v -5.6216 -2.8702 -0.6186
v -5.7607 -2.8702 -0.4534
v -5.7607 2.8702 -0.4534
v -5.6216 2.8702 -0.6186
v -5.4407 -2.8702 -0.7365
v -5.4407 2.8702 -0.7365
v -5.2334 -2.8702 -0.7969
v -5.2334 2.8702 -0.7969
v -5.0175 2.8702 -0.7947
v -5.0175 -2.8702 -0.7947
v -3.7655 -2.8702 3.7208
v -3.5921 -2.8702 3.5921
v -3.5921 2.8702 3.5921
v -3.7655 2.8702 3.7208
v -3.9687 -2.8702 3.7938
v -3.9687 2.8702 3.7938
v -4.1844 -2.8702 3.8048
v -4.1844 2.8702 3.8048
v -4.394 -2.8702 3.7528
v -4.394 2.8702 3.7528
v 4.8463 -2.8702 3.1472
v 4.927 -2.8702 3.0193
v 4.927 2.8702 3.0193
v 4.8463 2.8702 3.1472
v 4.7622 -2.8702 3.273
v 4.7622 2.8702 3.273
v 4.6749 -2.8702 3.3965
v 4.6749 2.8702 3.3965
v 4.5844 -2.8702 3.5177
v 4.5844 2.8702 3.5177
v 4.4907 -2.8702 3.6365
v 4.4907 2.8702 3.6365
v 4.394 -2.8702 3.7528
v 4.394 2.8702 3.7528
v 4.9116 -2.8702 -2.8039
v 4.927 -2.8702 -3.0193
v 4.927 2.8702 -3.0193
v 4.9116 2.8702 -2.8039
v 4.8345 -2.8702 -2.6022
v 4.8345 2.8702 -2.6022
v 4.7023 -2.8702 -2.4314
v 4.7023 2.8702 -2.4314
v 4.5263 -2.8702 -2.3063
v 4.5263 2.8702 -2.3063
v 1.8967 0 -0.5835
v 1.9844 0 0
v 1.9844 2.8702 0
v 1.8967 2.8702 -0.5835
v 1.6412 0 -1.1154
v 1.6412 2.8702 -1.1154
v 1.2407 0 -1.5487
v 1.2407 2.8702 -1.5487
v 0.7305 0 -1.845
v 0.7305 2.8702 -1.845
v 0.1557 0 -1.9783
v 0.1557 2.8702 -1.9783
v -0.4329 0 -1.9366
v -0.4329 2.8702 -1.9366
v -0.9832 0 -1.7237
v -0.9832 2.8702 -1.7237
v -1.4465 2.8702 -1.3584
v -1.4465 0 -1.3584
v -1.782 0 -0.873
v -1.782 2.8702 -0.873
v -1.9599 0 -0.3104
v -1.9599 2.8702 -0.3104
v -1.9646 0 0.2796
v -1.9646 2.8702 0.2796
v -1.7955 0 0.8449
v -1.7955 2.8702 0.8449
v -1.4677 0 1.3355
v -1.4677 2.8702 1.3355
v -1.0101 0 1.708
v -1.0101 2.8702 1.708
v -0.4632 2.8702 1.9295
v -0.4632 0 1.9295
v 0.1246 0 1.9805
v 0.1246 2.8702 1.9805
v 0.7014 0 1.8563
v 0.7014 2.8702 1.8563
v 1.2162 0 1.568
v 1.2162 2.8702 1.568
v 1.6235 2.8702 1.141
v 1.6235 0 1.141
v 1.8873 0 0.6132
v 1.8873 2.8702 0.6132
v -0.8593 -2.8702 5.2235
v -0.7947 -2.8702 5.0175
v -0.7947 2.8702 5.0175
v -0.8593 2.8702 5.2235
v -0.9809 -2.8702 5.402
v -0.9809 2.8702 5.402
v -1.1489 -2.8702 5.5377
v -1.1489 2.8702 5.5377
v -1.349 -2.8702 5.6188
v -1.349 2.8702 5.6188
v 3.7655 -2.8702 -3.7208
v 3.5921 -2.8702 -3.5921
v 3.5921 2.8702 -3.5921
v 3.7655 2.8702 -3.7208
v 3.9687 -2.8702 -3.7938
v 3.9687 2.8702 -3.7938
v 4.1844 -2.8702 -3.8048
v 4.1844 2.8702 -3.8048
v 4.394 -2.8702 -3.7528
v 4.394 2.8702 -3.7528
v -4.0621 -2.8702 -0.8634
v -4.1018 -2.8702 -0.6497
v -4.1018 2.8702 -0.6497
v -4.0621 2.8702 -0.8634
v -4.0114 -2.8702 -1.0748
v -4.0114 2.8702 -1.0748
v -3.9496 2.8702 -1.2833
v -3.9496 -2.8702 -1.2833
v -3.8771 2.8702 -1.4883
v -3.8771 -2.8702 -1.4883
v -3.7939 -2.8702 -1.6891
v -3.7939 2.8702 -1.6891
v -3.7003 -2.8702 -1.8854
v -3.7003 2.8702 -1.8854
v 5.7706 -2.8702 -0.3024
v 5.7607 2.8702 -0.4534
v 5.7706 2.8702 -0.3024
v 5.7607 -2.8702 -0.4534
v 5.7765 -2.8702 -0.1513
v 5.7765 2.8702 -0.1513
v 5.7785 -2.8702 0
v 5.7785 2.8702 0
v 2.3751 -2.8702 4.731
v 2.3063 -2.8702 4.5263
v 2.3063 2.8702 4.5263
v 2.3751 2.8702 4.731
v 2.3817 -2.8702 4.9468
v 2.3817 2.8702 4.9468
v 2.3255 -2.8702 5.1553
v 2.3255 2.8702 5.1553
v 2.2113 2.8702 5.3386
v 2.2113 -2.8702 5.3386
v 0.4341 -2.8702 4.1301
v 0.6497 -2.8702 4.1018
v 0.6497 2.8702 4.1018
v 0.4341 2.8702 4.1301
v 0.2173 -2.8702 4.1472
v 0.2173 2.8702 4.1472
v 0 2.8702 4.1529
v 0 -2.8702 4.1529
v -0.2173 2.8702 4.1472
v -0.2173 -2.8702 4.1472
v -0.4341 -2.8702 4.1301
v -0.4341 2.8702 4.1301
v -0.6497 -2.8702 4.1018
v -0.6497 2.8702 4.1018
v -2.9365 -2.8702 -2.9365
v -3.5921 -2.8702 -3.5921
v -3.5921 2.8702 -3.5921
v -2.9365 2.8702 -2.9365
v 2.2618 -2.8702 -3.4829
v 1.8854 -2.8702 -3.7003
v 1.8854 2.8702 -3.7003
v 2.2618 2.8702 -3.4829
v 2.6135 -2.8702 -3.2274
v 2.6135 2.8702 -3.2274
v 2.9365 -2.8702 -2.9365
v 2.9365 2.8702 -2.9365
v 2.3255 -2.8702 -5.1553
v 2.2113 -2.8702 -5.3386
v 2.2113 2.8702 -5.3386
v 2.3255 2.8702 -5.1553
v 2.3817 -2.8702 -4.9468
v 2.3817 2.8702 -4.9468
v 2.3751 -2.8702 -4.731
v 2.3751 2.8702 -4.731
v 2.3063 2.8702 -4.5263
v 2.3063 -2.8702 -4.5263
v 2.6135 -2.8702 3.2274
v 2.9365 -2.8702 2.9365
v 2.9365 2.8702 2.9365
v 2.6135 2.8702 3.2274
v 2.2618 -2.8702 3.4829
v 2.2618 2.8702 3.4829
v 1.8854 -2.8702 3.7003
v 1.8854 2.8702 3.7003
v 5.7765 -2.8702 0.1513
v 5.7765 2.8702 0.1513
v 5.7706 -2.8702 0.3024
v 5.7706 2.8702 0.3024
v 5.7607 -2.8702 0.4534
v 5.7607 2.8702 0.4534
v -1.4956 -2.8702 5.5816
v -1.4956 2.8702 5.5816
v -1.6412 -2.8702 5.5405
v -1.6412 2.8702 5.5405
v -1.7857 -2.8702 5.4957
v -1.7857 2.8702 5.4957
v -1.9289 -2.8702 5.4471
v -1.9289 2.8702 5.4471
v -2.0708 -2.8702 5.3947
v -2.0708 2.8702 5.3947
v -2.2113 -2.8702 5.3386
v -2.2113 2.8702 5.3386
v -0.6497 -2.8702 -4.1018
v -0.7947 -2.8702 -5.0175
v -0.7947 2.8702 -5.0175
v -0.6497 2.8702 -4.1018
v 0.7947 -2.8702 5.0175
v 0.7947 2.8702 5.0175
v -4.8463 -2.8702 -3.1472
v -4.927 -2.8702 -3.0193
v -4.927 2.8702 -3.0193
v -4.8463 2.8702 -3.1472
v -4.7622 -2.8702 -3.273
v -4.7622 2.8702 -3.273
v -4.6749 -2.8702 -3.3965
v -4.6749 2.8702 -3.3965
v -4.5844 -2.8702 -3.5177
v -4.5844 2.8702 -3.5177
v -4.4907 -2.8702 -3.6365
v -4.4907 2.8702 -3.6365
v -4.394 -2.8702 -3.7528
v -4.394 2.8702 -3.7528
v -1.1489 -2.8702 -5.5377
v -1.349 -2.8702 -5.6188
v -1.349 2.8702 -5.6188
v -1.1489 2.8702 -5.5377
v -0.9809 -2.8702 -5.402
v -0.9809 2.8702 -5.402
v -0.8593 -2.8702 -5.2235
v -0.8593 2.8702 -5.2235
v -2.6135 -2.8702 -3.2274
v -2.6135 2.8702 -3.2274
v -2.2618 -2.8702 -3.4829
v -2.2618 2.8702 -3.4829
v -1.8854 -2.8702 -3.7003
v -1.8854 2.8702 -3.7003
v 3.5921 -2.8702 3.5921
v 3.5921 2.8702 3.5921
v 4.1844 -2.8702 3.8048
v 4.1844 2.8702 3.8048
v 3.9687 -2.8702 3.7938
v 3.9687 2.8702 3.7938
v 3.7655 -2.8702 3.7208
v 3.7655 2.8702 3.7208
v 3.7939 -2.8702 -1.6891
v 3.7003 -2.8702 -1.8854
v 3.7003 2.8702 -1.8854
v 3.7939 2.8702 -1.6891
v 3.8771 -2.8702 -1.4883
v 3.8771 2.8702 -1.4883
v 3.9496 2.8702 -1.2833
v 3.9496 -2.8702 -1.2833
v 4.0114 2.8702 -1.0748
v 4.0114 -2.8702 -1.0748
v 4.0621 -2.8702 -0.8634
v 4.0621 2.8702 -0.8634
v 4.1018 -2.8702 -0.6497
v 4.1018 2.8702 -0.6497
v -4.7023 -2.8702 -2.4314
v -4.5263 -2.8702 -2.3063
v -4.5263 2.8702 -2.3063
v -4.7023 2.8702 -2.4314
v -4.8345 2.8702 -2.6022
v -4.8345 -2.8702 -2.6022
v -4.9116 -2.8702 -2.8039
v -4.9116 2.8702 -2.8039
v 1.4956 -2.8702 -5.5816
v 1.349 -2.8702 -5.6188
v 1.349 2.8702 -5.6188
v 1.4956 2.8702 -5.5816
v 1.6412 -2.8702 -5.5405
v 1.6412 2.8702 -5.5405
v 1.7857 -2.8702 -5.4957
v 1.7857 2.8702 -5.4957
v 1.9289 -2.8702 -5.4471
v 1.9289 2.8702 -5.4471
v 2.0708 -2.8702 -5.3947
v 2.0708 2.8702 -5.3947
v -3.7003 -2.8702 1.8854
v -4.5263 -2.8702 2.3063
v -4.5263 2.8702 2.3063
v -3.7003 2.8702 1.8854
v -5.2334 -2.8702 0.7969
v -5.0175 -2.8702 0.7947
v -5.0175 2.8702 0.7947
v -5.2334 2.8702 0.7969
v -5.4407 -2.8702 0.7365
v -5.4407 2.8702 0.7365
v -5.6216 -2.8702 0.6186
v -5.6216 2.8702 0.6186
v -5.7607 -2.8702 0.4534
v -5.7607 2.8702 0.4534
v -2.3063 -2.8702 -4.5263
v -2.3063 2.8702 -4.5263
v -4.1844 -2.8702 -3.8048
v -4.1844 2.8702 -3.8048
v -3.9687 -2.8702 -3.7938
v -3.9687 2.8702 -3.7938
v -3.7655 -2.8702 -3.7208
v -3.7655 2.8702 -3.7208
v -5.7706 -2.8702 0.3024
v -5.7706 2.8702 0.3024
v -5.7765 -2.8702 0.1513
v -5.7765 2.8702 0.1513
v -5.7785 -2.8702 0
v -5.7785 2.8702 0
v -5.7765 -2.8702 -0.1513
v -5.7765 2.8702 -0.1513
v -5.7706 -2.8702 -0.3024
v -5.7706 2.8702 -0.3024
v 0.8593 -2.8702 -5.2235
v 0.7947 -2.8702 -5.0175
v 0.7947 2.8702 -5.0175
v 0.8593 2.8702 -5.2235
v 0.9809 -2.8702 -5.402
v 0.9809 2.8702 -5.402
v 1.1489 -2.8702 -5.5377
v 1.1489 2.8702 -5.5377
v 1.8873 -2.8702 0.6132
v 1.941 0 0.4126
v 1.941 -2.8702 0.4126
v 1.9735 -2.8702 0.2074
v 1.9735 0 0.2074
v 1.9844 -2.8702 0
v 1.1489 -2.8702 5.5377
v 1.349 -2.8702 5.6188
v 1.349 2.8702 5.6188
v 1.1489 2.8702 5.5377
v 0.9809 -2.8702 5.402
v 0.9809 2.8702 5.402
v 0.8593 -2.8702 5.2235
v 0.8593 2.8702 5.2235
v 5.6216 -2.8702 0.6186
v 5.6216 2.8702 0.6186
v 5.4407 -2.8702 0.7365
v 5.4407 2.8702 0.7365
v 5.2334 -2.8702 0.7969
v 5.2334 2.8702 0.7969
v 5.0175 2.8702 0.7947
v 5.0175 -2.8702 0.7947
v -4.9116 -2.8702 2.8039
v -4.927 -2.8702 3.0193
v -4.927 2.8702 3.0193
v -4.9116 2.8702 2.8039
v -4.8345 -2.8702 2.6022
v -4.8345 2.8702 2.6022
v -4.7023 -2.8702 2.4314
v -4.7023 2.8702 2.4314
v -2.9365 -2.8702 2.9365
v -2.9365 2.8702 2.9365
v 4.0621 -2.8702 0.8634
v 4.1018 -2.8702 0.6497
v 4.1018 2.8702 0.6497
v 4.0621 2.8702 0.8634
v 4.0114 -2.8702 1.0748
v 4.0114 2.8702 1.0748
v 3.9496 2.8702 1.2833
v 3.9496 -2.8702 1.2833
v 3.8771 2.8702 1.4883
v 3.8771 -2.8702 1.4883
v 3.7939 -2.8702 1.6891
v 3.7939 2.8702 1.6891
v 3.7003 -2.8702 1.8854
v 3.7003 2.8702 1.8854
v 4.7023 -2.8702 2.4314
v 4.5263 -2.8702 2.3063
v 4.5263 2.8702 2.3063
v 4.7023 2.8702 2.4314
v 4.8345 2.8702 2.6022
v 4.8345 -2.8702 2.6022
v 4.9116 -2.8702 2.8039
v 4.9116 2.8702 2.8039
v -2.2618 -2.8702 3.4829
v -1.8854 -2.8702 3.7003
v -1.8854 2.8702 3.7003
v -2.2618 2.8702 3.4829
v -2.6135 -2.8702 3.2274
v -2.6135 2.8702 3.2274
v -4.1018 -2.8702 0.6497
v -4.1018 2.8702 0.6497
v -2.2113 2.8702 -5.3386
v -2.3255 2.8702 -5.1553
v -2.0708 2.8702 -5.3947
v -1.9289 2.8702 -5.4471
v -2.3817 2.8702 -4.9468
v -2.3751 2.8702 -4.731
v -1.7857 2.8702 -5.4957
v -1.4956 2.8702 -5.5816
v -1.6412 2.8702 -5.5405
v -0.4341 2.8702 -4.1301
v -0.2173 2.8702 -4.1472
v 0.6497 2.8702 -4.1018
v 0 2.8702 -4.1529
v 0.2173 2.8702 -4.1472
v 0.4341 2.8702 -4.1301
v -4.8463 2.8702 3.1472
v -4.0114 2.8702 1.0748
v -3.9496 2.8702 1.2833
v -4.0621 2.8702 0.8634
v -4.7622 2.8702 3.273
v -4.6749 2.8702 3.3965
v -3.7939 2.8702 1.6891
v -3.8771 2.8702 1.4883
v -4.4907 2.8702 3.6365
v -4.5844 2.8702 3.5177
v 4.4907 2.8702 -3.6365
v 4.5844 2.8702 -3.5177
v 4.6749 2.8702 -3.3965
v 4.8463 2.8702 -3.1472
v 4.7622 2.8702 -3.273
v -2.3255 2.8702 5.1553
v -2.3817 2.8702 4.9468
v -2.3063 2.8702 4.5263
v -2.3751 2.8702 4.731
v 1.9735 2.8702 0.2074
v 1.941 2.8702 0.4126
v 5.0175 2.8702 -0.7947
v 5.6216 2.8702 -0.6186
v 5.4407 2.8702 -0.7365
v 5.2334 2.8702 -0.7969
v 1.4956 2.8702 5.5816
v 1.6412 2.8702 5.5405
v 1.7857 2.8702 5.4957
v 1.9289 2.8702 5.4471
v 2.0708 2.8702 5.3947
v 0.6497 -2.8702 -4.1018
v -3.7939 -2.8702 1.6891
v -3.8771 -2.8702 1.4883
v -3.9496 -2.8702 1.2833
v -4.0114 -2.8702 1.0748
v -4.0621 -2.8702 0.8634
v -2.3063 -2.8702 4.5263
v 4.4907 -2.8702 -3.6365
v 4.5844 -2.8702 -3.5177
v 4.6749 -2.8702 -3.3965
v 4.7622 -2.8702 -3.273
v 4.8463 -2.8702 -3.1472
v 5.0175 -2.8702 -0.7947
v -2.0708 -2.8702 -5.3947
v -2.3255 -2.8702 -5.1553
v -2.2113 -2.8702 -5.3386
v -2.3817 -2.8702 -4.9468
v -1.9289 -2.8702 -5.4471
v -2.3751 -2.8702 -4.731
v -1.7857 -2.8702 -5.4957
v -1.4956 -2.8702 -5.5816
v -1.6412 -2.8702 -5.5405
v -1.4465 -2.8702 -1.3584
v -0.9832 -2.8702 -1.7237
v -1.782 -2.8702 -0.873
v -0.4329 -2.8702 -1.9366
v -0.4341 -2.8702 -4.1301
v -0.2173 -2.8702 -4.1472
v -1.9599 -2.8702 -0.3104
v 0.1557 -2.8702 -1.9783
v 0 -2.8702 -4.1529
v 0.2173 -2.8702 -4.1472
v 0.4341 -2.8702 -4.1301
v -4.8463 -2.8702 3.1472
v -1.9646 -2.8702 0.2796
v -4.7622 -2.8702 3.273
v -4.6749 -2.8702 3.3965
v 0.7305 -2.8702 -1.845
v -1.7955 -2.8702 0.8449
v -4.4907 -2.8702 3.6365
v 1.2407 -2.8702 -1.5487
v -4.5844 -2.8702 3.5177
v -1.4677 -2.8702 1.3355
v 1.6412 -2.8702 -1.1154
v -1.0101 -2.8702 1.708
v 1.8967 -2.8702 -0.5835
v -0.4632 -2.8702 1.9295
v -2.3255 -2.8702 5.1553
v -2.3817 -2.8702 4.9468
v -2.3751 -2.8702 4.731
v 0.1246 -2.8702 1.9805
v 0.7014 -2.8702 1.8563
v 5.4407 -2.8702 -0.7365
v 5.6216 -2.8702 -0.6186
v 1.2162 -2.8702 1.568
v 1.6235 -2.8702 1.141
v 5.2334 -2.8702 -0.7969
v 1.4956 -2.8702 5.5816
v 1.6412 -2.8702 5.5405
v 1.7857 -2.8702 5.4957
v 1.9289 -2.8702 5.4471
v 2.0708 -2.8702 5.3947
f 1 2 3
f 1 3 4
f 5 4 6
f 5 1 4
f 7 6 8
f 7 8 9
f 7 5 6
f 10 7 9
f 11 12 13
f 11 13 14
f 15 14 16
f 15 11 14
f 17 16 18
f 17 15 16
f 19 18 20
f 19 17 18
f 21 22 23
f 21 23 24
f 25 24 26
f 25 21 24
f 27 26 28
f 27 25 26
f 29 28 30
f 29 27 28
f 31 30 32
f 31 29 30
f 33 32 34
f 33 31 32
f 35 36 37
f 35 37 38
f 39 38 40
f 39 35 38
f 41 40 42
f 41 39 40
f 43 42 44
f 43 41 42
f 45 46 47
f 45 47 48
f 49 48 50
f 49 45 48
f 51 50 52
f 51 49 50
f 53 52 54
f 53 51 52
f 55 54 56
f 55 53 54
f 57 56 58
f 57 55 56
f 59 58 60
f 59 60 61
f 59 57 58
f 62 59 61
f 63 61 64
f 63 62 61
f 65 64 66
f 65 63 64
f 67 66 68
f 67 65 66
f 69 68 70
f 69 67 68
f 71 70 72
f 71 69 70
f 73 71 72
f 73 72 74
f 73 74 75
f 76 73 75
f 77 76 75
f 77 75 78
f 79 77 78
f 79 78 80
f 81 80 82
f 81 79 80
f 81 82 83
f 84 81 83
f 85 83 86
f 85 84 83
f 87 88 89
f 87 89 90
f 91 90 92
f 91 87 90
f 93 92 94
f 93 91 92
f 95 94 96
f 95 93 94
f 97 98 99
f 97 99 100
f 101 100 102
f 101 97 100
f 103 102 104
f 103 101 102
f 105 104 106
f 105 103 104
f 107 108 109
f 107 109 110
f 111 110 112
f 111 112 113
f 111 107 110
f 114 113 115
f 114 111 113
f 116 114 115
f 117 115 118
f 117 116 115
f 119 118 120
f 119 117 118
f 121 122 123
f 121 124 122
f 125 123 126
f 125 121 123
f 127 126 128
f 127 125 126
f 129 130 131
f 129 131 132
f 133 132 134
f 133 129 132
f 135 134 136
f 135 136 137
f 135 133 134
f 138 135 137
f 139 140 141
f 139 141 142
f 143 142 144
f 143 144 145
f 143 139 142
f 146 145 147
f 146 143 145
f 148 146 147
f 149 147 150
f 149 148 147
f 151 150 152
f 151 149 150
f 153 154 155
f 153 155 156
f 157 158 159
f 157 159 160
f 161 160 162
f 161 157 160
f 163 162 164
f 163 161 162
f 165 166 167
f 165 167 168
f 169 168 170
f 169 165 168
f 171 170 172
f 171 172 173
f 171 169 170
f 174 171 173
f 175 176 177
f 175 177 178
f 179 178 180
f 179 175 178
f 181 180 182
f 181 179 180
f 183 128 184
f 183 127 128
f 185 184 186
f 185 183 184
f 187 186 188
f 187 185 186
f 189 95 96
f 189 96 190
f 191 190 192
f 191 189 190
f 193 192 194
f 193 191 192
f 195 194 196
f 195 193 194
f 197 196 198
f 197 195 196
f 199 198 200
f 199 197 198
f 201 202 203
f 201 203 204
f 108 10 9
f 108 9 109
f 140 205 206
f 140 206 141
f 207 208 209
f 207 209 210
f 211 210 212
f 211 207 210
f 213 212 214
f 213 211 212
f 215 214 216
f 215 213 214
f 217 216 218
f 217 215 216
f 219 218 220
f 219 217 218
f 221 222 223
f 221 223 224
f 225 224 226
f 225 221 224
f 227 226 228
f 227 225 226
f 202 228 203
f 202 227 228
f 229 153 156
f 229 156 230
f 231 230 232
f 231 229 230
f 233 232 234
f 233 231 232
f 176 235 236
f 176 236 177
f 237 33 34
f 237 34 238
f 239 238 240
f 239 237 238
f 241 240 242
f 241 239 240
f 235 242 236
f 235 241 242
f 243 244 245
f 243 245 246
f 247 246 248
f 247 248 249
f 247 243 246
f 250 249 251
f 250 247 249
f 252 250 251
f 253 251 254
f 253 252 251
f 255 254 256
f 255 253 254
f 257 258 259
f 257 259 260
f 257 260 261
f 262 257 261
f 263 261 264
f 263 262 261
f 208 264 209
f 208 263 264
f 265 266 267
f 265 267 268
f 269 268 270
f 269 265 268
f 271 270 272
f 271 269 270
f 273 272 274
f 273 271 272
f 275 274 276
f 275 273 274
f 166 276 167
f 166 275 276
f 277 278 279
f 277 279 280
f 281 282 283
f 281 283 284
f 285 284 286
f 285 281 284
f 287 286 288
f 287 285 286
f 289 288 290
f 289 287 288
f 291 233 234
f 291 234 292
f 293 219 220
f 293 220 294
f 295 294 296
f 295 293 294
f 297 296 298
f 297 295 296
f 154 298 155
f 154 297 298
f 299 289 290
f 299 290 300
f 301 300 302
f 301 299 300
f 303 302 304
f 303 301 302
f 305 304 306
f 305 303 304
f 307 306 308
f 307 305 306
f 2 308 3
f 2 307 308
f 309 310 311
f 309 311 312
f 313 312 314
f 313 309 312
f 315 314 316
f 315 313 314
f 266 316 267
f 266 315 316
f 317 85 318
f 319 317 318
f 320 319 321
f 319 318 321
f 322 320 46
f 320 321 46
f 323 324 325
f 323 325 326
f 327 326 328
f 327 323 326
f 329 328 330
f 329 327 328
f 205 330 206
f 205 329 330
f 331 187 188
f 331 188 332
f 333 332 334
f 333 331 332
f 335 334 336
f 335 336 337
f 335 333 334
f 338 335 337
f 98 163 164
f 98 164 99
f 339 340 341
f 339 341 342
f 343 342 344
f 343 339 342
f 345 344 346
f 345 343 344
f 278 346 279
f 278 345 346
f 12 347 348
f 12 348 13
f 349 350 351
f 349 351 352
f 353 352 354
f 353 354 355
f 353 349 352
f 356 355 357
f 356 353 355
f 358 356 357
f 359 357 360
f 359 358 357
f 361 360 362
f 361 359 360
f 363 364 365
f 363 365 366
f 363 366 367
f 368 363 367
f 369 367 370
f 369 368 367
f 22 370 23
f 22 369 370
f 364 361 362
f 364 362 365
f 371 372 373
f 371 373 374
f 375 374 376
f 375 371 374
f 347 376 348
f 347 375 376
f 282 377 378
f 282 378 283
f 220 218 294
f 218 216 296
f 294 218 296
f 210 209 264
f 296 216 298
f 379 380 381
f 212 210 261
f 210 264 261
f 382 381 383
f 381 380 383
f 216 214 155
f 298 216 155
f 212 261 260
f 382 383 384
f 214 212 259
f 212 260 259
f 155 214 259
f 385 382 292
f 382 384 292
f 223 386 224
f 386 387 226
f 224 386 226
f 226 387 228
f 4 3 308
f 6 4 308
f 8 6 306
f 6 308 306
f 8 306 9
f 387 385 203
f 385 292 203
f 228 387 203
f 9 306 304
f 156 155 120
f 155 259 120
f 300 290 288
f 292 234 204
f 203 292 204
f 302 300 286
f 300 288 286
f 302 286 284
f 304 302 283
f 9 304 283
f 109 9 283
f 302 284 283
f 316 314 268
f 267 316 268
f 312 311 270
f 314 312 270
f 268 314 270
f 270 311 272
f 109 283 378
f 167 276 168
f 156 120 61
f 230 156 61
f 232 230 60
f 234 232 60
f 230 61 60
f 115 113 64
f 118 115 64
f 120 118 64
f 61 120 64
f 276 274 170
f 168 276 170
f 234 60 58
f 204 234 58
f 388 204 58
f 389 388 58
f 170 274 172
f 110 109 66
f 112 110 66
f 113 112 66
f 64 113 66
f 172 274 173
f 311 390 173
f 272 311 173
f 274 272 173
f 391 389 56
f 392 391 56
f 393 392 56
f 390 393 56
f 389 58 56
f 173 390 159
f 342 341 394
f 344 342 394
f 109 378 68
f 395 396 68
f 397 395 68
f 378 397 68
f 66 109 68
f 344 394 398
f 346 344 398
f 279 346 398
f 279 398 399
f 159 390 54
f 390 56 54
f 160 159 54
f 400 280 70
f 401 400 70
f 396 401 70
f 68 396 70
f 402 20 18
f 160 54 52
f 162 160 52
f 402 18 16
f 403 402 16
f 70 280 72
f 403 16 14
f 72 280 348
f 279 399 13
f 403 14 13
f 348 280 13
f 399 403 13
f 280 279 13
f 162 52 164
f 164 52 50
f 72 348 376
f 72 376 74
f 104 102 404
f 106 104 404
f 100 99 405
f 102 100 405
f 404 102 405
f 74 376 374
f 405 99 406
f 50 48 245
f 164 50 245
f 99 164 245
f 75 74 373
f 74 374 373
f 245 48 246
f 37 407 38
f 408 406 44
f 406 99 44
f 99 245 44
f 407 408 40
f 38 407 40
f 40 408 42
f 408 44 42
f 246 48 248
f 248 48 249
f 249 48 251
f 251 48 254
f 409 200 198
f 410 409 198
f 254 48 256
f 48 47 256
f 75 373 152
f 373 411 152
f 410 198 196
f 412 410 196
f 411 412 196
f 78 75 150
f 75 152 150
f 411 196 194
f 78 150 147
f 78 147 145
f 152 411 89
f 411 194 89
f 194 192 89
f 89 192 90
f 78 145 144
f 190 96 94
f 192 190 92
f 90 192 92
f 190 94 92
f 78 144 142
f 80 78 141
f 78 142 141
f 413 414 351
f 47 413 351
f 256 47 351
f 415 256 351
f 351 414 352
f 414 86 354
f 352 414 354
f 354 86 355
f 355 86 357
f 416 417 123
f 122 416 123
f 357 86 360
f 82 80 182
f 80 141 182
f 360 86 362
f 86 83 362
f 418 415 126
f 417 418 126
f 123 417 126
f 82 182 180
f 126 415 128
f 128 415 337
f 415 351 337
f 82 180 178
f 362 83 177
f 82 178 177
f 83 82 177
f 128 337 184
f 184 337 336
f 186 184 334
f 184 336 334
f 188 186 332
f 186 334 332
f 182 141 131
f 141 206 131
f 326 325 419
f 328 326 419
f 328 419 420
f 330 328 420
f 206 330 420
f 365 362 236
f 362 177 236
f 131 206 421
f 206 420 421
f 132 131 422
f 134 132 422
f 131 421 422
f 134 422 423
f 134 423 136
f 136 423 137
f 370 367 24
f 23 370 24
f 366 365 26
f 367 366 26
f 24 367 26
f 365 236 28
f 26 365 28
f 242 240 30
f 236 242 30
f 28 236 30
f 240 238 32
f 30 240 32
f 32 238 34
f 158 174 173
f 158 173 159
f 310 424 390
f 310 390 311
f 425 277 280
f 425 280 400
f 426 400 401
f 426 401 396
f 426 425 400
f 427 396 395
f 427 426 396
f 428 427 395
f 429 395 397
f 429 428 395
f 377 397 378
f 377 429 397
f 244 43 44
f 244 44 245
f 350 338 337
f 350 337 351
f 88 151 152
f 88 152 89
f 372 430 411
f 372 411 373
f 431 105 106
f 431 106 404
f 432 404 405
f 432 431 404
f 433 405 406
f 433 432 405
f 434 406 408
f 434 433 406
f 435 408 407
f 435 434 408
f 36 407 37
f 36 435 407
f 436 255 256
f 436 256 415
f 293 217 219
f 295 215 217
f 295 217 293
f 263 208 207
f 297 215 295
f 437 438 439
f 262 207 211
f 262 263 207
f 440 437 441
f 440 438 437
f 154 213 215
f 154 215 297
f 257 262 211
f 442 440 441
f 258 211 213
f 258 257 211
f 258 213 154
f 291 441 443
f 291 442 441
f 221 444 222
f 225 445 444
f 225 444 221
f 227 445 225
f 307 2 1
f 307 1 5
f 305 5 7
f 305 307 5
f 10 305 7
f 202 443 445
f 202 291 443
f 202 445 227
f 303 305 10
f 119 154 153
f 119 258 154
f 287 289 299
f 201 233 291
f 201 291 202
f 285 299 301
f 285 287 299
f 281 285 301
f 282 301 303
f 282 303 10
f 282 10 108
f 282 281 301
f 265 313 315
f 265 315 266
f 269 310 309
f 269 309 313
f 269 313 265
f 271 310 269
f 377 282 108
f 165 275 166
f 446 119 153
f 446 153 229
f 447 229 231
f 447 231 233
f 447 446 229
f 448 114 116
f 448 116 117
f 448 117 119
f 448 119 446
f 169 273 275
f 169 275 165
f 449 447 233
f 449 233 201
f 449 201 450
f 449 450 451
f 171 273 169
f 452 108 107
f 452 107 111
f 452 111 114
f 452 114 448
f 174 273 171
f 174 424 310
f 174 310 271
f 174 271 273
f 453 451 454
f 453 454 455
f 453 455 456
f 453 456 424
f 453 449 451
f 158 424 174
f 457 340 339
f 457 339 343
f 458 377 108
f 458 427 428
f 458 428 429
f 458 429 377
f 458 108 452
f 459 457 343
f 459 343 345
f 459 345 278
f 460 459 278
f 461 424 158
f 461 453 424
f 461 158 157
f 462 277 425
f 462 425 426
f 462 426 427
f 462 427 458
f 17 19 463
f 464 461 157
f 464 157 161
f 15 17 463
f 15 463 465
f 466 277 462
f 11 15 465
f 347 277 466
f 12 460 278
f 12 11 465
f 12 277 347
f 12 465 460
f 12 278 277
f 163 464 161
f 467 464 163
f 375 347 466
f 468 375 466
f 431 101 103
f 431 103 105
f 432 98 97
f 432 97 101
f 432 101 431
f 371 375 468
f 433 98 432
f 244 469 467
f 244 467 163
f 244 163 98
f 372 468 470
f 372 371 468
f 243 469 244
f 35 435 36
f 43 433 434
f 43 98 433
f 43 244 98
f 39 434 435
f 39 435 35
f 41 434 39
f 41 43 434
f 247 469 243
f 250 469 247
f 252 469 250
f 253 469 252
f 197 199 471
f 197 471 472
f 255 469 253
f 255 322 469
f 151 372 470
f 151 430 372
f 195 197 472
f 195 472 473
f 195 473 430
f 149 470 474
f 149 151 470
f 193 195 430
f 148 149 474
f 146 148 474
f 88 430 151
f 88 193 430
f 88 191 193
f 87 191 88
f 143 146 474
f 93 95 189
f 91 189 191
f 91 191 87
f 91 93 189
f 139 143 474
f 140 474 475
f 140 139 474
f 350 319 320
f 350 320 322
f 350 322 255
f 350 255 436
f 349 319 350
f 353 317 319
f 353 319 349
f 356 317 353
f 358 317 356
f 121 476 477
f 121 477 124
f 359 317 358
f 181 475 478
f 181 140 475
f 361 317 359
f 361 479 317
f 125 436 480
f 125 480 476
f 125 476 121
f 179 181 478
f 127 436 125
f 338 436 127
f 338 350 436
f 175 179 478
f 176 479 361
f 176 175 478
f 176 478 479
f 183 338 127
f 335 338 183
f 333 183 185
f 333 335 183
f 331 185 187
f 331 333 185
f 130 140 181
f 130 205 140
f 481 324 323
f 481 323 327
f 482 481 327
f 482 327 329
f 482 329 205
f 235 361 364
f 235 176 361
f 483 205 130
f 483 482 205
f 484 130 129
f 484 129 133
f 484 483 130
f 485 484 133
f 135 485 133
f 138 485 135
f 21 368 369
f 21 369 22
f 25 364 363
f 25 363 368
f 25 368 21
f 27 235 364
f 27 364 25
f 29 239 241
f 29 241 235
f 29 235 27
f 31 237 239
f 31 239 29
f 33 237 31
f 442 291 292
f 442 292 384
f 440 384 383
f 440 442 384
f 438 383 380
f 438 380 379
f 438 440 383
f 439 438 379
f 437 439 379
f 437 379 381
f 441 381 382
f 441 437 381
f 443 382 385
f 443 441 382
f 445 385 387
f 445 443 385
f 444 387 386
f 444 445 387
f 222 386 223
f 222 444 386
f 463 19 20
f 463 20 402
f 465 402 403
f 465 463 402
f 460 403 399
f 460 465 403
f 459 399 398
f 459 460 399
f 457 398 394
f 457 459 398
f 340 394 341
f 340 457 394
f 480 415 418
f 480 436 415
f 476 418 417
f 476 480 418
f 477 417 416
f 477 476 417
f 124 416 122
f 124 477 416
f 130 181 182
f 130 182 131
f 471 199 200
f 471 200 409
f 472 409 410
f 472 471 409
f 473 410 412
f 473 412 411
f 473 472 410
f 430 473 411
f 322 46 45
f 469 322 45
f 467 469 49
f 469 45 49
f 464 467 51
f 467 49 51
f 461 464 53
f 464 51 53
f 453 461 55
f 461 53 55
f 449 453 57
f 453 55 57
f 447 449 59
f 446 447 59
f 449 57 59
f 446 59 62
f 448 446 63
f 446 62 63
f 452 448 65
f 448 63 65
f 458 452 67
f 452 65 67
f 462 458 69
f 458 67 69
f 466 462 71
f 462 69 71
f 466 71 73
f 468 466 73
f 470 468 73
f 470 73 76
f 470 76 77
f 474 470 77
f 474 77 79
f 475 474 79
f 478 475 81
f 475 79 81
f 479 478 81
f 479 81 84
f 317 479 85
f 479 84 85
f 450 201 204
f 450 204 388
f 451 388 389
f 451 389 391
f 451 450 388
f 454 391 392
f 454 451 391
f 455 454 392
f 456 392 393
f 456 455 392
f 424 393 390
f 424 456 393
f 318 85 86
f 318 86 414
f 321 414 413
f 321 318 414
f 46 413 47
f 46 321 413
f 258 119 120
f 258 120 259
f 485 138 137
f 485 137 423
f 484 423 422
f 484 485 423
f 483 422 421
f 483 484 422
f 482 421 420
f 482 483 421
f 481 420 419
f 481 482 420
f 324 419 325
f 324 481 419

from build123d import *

# Parameters (mm, degrees)
F1_DEPTH = 2.8702


with BuildPart() as f1:
    # F0 (on Front) → F1 (new body, symmetric)
    with BuildSketch(Plane.XZ):
        with BuildLine():
            ThreePointArc((5.7785, 0), (5.7740449859, 0.2268628454), (5.760686813, 0.4533758847))
            ThreePointArc((5.760686813, 0.4533758847), (5.4407027929, 0.736461757), (5.0174567702, 0.7946870824))
            Line((5.0174567702, 0.7946870824), (4.1017709097, 0.6496566899))
            ThreePointArc((4.1017709097, 0.6496566899), (4.0381550424, 0.9694752516), (3.9496426065, 1.2833166759))
            Line((3.9496426065, 1.2833166759), (1.8872527745, 0.6132055982))
            ThreePointArc((1.8872527745, 0.6132055982), (1.9599440509, 0.3104246416), (1.984375, 0))
            Line((1.984375, 0), (5.7785, 0))
        make_face()
        with BuildLine():
            ThreePointArc((5.760686813, -0.4533758847), (5.7740449859, -0.2268628454), (5.7785, 0))
            Line((5.7785, 0), (1.984375, 0))
            ThreePointArc((1.984375, 0), (-1.9599440509, -0.3104246416), (1.8872527745, 0.6132055982))
            Line((1.8872527745, 0.6132055982), (3.9496426065, 1.2833166759))
            ThreePointArc((3.9496426065, 1.2833166759), (3.8367793106, 1.5892460263), (3.7002609943, 1.8853771464))
            Line((3.7002609943, 1.8853771464), (4.5263131429, 2.3062717387))
            ThreePointArc((4.5263131429, 2.3062717387), (4.8345023804, 2.6021547867), (4.9269811897, 3.0192579562))
            ThreePointArc((4.9269811897, 3.0192579562), (4.8046471547, 3.2103625915), (4.674904702, 3.3965170804))
            ThreePointArc((4.674904702, 3.3965170804), (4.5379538851, 3.5774343861), (4.3940058722, 3.7528355473))
            ThreePointArc((4.3940058722, 3.7528355473), (3.9687396612, 3.7937749409), (3.5921024484, 3.5921024484))
            Line((3.5921024484, 3.5921024484), (2.9365437516, 2.9365437516))
            ThreePointArc((2.9365437516, 2.9365437516), (2.6970927999, 3.1578899345), (2.4410133742, 3.3597666759))
            ThreePointArc((2.4410133742, 3.3597666759), (2.1698842894, 3.5409293385), (1.8853771464, 3.7002609943))
            Line((1.8853771464, 3.7002609943), (2.3062717387, 4.5263131429))
            ThreePointArc((2.3062717387, 4.5263131429), (2.3816863773, 4.9468366458), (2.2113362139, 5.3386378786))
            ThreePointArc((2.2113362139, 5.3386378786), (2.0000374143, 5.4213386346), (1.785654702, 5.4956800794))
            ThreePointArc((1.785654702, 5.4956800794), (1.5685186395, 5.5615475838), (1.348964035, 5.618839585))
            ThreePointArc((1.348964035, 5.618839585), (0.9808528714, 5.401995043), (0.7946870824, 5.0174567702))
            Line((0.7946870824, 5.0174567702), (0.6496566899, 4.1017709097))
            ThreePointArc((0.6496566899, 4.1017709097), (0.3258327786, 4.1400979953), (0, 4.1529))
            ThreePointArc((0, 4.1529), (-0.3258327786, 4.1400979953), (-0.6496566899, 4.1017709097))
            Line((-0.6496566899, 4.1017709097), (-0.7946870824, 5.0174567702))
            ThreePointArc((-0.7946870824, 5.0174567702), (-0.9808528714, 5.401995043), (-1.348964035, 5.618839585))
            ThreePointArc((-1.348964035, 5.618839585), (-1.5685186395, 5.5615475838), (-1.785654702, 5.4956800794))
            ThreePointArc((-1.785654702, 5.4956800794), (-2.0000374143, 5.4213386346), (-2.2113362139, 5.3386378786))
            ThreePointArc((-2.2113362139, 5.3386378786), (-2.3816863773, 4.9468366458), (-2.3062717387, 4.5263131429))
            Line((-2.3062717387, 4.5263131429), (-1.8853771464, 3.7002609943))
            ThreePointArc((-1.8853771464, 3.7002609943), (-2.1698842894, 3.5409293385), (-2.4410133742, 3.3597666759))
            ThreePointArc((-2.4410133742, 3.3597666759), (-2.6970927999, 3.1578899345), (-2.9365437516, 2.9365437516))
            Line((-2.9365437516, 2.9365437516), (-3.5921024484, 3.5921024484))
            ThreePointArc((-3.5921024484, 3.5921024484), (-3.9687396612, 3.7937749409), (-4.3940058722, 3.7528355473))
            ThreePointArc((-4.3940058722, 3.7528355473), (-4.5379538851, 3.5774343861), (-4.674904702, 3.3965170804))
            ThreePointArc((-4.674904702, 3.3965170804), (-4.8046471547, 3.2103625915), (-4.9269811897, 3.0192579562))
            ThreePointArc((-4.9269811897, 3.0192579562), (-4.8345023804, 2.6021547867), (-4.5263131429, 2.3062717387))
            Line((-4.5263131429, 2.3062717387), (-3.7002609943, 1.8853771464))
            ThreePointArc((-3.7002609943, 1.8853771464), (-3.8367793106, 1.5892460263), (-3.9496426065, 1.2833166759))
            ThreePointArc((-3.9496426065, 1.2833166759), (-4.0381550424, 0.9694752516), (-4.1017709097, 0.6496566899))
            Line((-4.1017709097, 0.6496566899), (-5.0174567702, 0.7946870824))
            ThreePointArc((-5.0174567702, 0.7946870824), (-5.4407027929, 0.736461757), (-5.760686813, 0.4533758847))
            ThreePointArc((-5.760686813, 0.4533758847), (-5.7740449859, 0.2268628454), (-5.7785, 0))
            ThreePointArc((-5.7785, 0), (-5.7740449859, -0.2268628454), (-5.760686813, -0.4533758847))
            ThreePointArc((-5.760686813, -0.4533758847), (-5.4407027929, -0.736461757), (-5.0174567702, -0.7946870824))
            Line((-5.0174567702, -0.7946870824), (-4.1017709097, -0.6496566899))
            ThreePointArc((-4.1017709097, -0.6496566899), (-4.0381550424, -0.9694752516), (-3.9496426065, -1.2833166759))
            ThreePointArc((-3.9496426065, -1.2833166759), (-3.8367793106, -1.5892460263), (-3.7002609943, -1.8853771464))
            Line((-3.7002609943, -1.8853771464), (-4.5263131429, -2.3062717387))
            ThreePointArc((-4.5263131429, -2.3062717387), (-4.8345023804, -2.6021547867), (-4.9269811897, -3.0192579562))
            ThreePointArc((-4.9269811897, -3.0192579562), (-4.8046471547, -3.2103625915), (-4.674904702, -3.3965170804))
            ThreePointArc((-4.674904702, -3.3965170804), (-4.5379538851, -3.5774343861), (-4.3940058722, -3.7528355473))
            ThreePointArc((-4.3940058722, -3.7528355473), (-3.9687396612, -3.7937749409), (-3.5921024484, -3.5921024484))
            Line((-3.5921024484, -3.5921024484), (-2.9365437516, -2.9365437516))
            ThreePointArc((-2.9365437516, -2.9365437516), (-2.6970927999, -3.1578899345), (-2.4410133742, -3.3597666759))
            ThreePointArc((-2.4410133742, -3.3597666759), (-2.1698842894, -3.5409293385), (-1.8853771464, -3.7002609943))
            Line((-1.8853771464, -3.7002609943), (-2.3062717387, -4.5263131429))
            ThreePointArc((-2.3062717387, -4.5263131429), (-2.3816863773, -4.9468366458), (-2.2113362139, -5.3386378786))
            ThreePointArc((-2.2113362139, -5.3386378786), (-2.0000374143, -5.4213386346), (-1.785654702, -5.4956800794))
            ThreePointArc((-1.785654702, -5.4956800794), (-1.5685186395, -5.5615475838), (-1.348964035, -5.618839585))
            ThreePointArc((-1.348964035, -5.618839585), (-0.9808528714, -5.401995043), (-0.7946870824, -5.0174567702))
            Line((-0.7946870824, -5.0174567702), (-0.6496566899, -4.1017709097))
            ThreePointArc((-0.6496566899, -4.1017709097), (-0.3258327786, -4.1400979953), (0, -4.1529))
            ThreePointArc((0, -4.1529), (0.3258327786, -4.1400979953), (0.6496566899, -4.1017709097))
            Line((0.6496566899, -4.1017709097), (0.7946870824, -5.0174567702))
            ThreePointArc((0.7946870824, -5.0174567702), (0.9808528714, -5.401995043), (1.348964035, -5.618839585))
            ThreePointArc((1.348964035, -5.618839585), (1.5685186395, -5.5615475838), (1.785654702, -5.4956800794))
            ThreePointArc((1.785654702, -5.4956800794), (2.0000374143, -5.4213386346), (2.2113362139, -5.3386378786))
            ThreePointArc((2.2113362139, -5.3386378786), (2.3816863773, -4.9468366458), (2.3062717387, -4.5263131429))
            Line((2.3062717387, -4.5263131429), (1.8853771464, -3.7002609943))
            ThreePointArc((1.8853771464, -3.7002609943), (2.1698842894, -3.5409293385), (2.4410133742, -3.3597666759))
            ThreePointArc((2.4410133742, -3.3597666759), (2.6970927999, -3.1578899345), (2.9365437516, -2.9365437516))
            Line((2.9365437516, -2.9365437516), (3.5921024484, -3.5921024484))
            ThreePointArc((3.5921024484, -3.5921024484), (3.9687396612, -3.7937749409), (4.3940058722, -3.7528355473))
            ThreePointArc((4.3940058722, -3.7528355473), (4.5379538851, -3.5774343861), (4.674904702, -3.3965170804))
            ThreePointArc((4.674904702, -3.3965170804), (4.8046471547, -3.2103625915), (4.9269811897, -3.0192579562))
            ThreePointArc((4.9269811897, -3.0192579562), (4.8345023804, -2.6021547867), (4.5263131429, -2.3062717387))
            Line((4.5263131429, -2.3062717387), (3.7002609943, -1.8853771464))
            ThreePointArc((3.7002609943, -1.8853771464), (3.8367793106, -1.5892460263), (3.9496426065, -1.2833166759))
            ThreePointArc((3.9496426065, -1.2833166759), (4.0381550424, -0.9694752516), (4.1017709097, -0.6496566899))
            Line((4.1017709097, -0.6496566899), (5.0174567702, -0.7946870824))
            ThreePointArc((5.0174567702, -0.7946870824), (5.4407027929, -0.736461757), (5.760686813, -0.4533758847))
        make_face()
    extrude(amount=F1_DEPTH, both=True)


solid = f1.part
